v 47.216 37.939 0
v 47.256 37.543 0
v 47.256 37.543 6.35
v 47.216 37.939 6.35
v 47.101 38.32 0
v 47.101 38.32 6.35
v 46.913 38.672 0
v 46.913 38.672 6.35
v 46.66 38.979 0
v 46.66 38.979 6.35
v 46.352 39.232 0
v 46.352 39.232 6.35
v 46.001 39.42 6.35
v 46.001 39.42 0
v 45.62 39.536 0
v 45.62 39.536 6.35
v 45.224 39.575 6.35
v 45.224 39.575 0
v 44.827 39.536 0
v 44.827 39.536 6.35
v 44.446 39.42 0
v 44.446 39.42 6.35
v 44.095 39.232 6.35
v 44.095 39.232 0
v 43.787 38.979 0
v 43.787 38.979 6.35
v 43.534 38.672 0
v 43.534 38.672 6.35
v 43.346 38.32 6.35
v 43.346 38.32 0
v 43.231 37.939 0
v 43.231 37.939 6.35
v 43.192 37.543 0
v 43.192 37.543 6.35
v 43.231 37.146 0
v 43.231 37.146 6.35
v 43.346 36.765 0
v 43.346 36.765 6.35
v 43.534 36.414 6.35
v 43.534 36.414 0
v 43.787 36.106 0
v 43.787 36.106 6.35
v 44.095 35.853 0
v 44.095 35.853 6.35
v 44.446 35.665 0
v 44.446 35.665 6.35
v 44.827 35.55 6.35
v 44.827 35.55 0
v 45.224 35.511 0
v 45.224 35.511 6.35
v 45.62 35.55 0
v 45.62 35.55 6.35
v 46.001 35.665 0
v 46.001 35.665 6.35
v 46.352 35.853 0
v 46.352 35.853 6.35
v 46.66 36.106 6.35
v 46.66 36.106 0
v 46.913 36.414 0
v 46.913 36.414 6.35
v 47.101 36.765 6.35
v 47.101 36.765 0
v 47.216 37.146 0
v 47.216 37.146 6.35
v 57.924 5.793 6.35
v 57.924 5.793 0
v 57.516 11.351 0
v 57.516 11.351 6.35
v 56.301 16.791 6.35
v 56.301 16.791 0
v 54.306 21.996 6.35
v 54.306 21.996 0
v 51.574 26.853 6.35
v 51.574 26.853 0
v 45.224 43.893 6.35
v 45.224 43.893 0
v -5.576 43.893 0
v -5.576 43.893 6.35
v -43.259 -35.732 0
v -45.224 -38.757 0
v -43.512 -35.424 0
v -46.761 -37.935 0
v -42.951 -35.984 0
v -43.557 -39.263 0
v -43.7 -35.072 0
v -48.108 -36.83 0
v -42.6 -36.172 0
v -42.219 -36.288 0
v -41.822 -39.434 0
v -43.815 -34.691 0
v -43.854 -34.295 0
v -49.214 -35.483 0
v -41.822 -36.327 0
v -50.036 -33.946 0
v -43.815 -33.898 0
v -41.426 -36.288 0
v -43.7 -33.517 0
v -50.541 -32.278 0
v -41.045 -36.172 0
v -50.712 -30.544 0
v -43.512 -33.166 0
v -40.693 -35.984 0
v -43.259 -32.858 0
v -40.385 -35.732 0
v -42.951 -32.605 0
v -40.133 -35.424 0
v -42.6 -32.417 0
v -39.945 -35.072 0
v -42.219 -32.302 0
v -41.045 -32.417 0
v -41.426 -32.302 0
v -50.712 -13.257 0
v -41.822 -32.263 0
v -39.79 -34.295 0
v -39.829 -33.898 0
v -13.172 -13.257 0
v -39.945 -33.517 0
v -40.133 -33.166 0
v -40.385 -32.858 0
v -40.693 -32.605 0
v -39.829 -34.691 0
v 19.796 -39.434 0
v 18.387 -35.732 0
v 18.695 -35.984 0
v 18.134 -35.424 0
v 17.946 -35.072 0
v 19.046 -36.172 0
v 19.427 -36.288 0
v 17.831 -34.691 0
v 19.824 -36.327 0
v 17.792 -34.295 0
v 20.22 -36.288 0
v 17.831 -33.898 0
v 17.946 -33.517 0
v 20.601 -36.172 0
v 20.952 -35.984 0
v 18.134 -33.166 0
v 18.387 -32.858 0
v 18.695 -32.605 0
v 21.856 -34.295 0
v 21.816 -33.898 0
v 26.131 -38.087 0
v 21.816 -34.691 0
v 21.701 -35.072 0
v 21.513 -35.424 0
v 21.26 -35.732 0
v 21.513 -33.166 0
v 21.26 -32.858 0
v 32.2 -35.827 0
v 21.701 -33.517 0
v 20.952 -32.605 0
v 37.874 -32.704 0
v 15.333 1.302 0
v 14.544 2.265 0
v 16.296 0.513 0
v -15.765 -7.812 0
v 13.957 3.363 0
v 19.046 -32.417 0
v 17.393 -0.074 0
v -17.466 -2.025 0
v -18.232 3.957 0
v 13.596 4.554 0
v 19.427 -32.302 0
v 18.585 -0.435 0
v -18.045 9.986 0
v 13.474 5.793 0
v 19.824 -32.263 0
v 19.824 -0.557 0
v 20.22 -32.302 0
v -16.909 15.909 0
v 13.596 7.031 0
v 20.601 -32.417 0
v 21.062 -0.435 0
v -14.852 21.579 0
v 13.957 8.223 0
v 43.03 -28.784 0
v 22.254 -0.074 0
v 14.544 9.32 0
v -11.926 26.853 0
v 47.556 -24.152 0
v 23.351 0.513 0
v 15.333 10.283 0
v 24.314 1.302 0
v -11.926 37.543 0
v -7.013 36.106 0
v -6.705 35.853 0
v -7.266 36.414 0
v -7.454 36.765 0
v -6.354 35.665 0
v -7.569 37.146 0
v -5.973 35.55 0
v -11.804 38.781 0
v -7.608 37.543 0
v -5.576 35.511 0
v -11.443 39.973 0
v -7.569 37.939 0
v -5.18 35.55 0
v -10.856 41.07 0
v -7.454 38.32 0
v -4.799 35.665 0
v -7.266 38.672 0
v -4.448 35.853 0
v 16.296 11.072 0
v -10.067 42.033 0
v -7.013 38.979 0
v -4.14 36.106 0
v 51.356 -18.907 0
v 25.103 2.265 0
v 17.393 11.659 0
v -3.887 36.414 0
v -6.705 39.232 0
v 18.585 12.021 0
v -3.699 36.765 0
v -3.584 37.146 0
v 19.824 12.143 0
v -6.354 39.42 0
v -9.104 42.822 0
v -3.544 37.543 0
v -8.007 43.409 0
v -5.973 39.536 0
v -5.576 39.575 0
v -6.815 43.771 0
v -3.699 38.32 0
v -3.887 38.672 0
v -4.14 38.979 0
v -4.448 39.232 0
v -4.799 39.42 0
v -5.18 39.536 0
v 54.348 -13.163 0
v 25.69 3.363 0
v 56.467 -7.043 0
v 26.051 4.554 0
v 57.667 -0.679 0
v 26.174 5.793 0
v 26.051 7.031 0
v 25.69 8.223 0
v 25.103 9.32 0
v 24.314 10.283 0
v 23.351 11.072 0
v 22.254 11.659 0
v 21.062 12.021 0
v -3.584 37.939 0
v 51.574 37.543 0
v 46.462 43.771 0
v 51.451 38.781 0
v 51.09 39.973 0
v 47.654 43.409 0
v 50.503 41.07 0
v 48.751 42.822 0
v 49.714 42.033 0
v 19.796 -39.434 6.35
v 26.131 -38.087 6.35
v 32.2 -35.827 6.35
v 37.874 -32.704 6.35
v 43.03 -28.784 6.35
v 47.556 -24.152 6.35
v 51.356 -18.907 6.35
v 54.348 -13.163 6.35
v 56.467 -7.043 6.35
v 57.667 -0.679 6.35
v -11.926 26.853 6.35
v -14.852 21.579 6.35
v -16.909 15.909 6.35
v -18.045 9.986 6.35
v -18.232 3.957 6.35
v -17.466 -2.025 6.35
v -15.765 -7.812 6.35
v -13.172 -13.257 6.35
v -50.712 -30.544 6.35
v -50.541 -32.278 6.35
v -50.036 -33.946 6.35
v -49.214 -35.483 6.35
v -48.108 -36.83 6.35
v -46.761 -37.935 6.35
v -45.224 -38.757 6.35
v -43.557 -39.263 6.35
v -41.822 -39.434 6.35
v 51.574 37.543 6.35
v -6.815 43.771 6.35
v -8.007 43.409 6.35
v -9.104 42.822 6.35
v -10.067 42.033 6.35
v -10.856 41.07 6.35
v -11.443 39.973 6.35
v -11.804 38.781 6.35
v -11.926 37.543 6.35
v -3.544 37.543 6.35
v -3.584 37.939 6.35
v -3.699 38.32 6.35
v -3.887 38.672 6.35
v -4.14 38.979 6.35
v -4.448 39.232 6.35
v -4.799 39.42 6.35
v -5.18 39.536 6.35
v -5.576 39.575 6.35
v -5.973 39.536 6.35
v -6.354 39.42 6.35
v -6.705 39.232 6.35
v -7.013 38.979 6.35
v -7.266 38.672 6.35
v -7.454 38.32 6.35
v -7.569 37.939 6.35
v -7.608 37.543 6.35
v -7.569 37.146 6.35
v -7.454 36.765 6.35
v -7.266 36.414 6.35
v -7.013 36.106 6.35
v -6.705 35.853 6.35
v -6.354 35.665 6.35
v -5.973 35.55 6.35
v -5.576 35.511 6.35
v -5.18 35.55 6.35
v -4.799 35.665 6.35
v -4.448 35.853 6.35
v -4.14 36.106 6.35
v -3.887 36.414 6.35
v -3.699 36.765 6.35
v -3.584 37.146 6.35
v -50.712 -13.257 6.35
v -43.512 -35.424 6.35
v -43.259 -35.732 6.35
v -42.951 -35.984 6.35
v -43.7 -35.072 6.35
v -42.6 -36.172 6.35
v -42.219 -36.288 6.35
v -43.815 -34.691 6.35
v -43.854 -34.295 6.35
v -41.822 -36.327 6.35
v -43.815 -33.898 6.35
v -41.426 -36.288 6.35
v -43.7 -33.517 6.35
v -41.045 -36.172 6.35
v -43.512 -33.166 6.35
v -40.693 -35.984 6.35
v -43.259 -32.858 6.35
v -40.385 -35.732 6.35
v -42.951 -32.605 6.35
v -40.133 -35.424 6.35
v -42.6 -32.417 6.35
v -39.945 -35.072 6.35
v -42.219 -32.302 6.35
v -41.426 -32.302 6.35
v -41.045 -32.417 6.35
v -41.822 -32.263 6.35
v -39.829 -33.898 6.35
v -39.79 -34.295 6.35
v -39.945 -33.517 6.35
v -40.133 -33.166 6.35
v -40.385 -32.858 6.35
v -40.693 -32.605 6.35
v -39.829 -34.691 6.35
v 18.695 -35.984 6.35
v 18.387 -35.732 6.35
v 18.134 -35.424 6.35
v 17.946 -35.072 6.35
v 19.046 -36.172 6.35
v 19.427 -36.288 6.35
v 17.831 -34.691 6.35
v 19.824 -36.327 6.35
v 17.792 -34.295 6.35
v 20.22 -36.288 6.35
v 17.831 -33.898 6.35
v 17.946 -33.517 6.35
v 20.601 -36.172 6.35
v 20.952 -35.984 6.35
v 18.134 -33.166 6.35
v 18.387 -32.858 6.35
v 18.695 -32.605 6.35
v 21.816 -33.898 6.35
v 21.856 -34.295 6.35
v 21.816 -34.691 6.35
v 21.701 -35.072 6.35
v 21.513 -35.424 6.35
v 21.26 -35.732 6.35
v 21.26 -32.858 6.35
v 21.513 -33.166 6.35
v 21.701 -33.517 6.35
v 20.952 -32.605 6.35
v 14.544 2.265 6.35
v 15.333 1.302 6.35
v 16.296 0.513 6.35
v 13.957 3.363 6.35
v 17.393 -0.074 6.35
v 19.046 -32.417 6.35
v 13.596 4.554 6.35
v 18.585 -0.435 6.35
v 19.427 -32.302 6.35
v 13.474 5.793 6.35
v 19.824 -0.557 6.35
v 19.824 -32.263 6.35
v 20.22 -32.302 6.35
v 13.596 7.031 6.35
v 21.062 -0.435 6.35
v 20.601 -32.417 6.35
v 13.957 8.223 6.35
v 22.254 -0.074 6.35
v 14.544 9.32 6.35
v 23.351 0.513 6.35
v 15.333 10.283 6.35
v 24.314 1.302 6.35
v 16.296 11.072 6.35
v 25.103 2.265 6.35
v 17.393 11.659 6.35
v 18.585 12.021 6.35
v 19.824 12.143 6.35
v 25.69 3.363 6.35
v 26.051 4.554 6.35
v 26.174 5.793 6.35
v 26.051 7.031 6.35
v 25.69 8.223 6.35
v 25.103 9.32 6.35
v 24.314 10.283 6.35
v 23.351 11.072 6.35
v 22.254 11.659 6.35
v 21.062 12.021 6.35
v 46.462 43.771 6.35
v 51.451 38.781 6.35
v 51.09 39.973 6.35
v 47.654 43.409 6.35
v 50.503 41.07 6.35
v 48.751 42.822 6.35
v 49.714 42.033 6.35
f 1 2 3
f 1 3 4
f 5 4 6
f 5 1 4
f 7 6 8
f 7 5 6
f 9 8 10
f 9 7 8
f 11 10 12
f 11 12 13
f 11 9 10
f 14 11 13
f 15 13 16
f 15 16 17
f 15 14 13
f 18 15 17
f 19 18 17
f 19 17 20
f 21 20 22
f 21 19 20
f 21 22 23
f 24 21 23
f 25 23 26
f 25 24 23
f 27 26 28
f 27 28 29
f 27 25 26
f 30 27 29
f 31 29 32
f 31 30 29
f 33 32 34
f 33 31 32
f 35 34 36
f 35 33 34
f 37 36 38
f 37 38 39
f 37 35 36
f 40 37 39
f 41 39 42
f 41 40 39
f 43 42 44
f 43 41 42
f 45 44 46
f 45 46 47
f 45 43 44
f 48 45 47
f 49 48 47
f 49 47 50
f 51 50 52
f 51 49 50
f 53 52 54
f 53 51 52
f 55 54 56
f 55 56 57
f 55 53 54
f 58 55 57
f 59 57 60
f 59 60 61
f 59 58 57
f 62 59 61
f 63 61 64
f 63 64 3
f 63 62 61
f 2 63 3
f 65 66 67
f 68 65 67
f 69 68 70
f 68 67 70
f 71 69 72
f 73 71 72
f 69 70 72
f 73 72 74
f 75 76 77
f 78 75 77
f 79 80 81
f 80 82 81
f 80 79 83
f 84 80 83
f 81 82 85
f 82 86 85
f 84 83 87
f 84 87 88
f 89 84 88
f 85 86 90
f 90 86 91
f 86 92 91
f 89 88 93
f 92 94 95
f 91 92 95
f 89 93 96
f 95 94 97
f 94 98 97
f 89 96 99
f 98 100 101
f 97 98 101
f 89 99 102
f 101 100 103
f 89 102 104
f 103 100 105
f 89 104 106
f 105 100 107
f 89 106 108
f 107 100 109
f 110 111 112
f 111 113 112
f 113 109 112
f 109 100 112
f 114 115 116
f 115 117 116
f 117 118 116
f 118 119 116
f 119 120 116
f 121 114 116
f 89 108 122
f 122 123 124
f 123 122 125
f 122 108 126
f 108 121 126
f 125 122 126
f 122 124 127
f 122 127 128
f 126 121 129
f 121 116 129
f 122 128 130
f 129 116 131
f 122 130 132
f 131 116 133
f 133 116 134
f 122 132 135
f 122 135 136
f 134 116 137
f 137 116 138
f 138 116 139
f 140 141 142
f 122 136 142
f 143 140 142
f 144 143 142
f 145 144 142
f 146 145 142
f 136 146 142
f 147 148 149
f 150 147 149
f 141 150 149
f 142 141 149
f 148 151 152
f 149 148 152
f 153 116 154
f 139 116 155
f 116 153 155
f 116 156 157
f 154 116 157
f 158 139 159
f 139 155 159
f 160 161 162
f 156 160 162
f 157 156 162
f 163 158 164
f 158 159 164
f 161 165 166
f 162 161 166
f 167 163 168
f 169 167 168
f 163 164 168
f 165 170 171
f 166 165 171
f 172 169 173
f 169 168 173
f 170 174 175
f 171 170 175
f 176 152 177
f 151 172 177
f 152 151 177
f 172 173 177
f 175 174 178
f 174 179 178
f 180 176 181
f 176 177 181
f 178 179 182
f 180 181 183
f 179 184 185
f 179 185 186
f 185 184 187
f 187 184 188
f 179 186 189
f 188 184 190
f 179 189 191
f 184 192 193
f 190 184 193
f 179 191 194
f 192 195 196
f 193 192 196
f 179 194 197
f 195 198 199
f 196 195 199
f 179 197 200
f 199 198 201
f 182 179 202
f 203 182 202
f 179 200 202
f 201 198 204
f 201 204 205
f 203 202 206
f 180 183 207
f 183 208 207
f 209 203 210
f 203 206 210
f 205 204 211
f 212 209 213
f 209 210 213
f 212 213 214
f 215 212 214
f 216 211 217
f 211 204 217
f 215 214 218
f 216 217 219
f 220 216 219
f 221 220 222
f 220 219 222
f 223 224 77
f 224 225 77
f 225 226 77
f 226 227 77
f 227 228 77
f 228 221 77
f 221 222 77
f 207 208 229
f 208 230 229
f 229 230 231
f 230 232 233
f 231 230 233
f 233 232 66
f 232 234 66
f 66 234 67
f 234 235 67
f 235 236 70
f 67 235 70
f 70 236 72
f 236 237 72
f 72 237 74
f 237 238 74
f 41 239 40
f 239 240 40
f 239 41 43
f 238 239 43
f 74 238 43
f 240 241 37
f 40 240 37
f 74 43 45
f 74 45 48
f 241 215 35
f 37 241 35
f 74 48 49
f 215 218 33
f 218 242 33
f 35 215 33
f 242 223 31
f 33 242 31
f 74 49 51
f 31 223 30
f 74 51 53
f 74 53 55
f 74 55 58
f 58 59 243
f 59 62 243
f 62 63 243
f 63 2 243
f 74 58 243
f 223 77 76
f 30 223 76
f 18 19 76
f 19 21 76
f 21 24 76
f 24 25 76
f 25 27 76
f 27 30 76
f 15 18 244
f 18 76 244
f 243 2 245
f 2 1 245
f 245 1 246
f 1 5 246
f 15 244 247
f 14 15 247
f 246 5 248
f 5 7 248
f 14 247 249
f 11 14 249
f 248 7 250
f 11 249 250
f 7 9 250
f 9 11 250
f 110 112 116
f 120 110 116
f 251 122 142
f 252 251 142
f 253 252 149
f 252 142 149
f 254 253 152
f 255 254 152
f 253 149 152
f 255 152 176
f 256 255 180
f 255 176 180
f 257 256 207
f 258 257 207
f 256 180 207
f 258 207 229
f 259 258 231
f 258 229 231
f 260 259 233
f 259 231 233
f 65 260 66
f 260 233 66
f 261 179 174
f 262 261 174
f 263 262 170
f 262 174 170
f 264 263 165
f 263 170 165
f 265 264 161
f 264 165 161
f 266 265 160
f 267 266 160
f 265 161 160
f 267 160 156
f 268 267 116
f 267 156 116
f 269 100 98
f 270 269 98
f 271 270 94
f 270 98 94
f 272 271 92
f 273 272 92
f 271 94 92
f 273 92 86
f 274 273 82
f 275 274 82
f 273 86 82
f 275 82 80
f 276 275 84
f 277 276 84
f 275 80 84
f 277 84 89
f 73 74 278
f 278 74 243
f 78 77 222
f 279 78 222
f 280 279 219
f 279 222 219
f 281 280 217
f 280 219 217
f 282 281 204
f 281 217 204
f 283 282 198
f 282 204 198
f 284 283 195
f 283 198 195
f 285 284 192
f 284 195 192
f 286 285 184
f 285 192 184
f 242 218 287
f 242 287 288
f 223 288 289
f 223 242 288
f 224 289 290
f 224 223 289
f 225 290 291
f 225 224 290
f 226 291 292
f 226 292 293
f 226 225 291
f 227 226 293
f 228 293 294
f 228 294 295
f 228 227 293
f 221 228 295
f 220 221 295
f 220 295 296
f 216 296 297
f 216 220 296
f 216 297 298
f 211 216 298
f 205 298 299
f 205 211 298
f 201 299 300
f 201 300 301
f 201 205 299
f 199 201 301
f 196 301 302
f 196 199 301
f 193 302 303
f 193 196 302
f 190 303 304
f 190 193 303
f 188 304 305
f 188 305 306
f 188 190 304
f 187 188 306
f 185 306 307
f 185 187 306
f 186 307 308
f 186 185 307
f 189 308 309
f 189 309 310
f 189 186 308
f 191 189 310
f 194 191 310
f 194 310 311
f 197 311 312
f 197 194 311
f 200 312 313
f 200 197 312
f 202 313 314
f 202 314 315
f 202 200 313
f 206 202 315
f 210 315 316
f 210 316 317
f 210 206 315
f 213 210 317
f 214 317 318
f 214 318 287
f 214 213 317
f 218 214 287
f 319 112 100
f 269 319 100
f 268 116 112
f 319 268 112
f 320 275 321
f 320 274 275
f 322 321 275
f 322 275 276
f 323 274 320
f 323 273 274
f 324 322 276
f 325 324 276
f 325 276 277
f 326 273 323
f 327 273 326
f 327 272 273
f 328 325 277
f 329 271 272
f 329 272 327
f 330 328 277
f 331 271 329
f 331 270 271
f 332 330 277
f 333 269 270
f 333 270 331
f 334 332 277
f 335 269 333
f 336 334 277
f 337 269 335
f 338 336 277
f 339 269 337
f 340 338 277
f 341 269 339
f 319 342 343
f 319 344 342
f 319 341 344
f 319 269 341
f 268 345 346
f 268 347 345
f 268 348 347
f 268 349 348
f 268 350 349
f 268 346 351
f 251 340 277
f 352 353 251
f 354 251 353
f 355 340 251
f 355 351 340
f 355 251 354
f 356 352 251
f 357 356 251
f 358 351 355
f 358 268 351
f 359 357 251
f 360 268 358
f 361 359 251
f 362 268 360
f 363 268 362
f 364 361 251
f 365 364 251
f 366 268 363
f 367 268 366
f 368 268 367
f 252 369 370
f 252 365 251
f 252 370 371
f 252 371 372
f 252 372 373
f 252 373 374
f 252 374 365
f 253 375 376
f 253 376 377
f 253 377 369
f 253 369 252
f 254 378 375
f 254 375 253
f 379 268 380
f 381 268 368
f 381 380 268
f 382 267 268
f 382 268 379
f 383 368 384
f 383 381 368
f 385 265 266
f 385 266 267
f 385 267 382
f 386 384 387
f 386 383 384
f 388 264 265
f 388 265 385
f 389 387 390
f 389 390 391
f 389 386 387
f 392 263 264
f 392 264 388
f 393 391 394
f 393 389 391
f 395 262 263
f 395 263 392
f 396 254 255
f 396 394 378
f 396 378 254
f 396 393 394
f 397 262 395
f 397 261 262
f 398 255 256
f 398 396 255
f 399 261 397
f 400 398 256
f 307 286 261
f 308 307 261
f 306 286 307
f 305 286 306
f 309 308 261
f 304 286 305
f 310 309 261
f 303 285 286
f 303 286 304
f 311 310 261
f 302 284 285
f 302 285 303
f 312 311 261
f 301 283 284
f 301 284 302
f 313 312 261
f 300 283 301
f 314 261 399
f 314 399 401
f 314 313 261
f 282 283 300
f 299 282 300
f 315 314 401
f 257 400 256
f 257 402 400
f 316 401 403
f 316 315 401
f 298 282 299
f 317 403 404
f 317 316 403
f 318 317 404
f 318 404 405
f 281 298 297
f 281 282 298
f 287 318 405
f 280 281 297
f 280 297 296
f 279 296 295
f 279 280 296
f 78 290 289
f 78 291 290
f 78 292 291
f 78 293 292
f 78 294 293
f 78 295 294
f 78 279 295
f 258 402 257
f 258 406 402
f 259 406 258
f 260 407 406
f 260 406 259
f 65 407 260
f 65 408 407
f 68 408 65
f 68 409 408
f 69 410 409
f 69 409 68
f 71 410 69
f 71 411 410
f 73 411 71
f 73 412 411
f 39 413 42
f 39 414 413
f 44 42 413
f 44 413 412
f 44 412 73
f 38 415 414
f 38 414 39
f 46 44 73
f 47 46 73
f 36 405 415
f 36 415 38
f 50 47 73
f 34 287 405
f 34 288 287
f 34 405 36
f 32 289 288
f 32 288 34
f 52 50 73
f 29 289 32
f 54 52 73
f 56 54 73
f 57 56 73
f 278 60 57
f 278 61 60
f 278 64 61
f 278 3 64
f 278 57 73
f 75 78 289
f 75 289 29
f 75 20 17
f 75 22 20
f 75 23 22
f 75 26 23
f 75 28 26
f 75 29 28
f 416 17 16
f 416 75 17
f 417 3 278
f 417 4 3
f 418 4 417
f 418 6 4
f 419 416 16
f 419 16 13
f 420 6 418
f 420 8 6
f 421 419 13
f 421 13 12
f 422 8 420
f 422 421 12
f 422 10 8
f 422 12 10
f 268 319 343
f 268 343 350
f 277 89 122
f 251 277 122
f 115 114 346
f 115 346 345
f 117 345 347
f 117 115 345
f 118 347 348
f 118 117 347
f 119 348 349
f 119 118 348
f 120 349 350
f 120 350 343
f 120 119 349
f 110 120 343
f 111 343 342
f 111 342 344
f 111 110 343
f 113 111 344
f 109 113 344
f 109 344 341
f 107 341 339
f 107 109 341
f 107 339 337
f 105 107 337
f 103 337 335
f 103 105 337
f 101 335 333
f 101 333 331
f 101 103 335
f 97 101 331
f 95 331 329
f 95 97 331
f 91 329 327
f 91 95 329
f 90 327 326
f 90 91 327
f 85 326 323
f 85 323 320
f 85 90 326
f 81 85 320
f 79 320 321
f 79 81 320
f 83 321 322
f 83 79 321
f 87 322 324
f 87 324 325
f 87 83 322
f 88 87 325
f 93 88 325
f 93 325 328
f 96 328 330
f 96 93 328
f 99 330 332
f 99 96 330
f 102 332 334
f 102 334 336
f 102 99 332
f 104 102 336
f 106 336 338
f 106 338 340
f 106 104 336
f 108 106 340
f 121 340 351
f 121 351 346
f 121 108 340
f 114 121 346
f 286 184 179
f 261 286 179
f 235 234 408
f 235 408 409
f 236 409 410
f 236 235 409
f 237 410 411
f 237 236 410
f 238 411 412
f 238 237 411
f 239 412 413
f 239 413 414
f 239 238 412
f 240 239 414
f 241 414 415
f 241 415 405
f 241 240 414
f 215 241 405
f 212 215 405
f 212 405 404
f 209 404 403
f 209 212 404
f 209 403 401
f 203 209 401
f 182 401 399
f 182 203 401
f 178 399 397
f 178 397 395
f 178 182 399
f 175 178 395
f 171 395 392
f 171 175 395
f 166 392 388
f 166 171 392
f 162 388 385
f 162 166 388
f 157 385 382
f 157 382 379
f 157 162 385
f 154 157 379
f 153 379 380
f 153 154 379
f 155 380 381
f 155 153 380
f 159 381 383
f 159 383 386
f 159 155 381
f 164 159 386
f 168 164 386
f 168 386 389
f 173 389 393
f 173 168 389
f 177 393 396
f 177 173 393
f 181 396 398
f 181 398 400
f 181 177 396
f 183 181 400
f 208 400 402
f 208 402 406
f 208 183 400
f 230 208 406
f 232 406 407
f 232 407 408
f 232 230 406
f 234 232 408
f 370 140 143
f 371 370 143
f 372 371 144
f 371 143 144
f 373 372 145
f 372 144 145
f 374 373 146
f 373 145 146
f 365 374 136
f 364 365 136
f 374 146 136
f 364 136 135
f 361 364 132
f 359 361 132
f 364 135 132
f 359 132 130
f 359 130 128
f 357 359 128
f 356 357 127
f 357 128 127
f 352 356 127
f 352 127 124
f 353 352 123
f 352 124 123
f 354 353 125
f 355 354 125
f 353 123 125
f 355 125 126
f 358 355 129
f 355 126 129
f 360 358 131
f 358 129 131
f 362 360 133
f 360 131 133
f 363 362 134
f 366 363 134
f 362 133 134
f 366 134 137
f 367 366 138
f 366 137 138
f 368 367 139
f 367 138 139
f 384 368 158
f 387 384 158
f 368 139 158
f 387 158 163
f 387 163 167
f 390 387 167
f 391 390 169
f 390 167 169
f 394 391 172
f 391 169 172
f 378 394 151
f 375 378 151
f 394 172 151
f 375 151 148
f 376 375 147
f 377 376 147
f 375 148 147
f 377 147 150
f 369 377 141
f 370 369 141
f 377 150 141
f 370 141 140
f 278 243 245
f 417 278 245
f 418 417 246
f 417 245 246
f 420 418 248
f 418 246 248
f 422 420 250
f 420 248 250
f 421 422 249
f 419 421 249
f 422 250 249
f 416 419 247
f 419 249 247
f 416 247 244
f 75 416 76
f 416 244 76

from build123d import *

# Parameters (mm, degrees)
F0_R     = 2.032
F0_R_2   = 6.35
F1_DEPTH = 6.35


with BuildPart() as f1:
    # F0 (on Top) → F1 (new body)
    with BuildSketch(Plane.XY):
        with BuildLine():
            ThreePointArc((19.7957990072, -39.4337052755), (47.5560493208, -24.1519845894), (57.9235114877, 5.7926011118))
            ThreePointArc((57.9235114877, 5.7926011118), (56.3014842932, 16.7911237399), (51.5735114877, 26.8531685306))
            Line((51.5735114877, 26.8531685306), (51.5735114877, 37.5426011118))
            ThreePointArc((51.5735114877, 37.5426011118), (49.7136395482, 42.0327291723), (45.2235114877, 43.8926011118))
            Line((45.2235114877, 43.8926011118), (19.8235114877, 43.8926011118))
            Line((19.8235114877, 43.8926011118), (-5.5764885123, 43.8926011118))
            ThreePointArc((-5.5764885123, 43.8926011118), (-10.0666165728, 42.0327291723), (-11.9264885123, 37.5426011118))
            Line((-11.9264885123, 37.5426011118), (-11.9264885123, 26.8531685306))
            ThreePointArc((-11.9264885123, 26.8531685306), (-18.25813166, 6.9751640805), (-13.1720563965, -13.2573988882))
            Line((-13.1720563965, -13.2573988882), (-50.7122885123, -13.2573988882))
            Line((-50.7122885123, -13.2573988882), (-50.7122885123, -25.9573988882))
            Line((-50.7122885123, -25.9573988882), (-50.7122885123, -30.5437052755))
            ThreePointArc((-50.7122885123, -30.5437052755), (-48.1084677971, -36.8298845602), (-41.8222885123, -39.4337052755))
            Line((-41.8222885123, -39.4337052755), (19.7957990072, -39.4337052755))
        make_face()
        with Locations((-41.8222885123, -34.2946651749)):
            Circle(F0_R, mode=Mode.SUBTRACT)
        with BuildLine():
            ThreePointArc((17.7915114877, -34.2946651749), (19.8235114877, -32.2626651749), (21.8555114877, -34.2946651749))
            ThreePointArc((21.8555114877, -34.2946651749), (19.8235114877, -36.3266651749), (17.7915114877, -34.2946651749))
        make_face(mode=Mode.SUBTRACT)
        with Locations((-5.5764885123, 37.5426011118)):
            Circle(F0_R, mode=Mode.SUBTRACT)
        with Locations((19.8235114877, 5.7926011118)):
            Circle(F0_R_2, mode=Mode.SUBTRACT)
        with Locations((45.2235114877, 37.5426011118)):
            Circle(F0_R, mode=Mode.SUBTRACT)
    extrude(amount=F1_DEPTH)


solid = f1.part
